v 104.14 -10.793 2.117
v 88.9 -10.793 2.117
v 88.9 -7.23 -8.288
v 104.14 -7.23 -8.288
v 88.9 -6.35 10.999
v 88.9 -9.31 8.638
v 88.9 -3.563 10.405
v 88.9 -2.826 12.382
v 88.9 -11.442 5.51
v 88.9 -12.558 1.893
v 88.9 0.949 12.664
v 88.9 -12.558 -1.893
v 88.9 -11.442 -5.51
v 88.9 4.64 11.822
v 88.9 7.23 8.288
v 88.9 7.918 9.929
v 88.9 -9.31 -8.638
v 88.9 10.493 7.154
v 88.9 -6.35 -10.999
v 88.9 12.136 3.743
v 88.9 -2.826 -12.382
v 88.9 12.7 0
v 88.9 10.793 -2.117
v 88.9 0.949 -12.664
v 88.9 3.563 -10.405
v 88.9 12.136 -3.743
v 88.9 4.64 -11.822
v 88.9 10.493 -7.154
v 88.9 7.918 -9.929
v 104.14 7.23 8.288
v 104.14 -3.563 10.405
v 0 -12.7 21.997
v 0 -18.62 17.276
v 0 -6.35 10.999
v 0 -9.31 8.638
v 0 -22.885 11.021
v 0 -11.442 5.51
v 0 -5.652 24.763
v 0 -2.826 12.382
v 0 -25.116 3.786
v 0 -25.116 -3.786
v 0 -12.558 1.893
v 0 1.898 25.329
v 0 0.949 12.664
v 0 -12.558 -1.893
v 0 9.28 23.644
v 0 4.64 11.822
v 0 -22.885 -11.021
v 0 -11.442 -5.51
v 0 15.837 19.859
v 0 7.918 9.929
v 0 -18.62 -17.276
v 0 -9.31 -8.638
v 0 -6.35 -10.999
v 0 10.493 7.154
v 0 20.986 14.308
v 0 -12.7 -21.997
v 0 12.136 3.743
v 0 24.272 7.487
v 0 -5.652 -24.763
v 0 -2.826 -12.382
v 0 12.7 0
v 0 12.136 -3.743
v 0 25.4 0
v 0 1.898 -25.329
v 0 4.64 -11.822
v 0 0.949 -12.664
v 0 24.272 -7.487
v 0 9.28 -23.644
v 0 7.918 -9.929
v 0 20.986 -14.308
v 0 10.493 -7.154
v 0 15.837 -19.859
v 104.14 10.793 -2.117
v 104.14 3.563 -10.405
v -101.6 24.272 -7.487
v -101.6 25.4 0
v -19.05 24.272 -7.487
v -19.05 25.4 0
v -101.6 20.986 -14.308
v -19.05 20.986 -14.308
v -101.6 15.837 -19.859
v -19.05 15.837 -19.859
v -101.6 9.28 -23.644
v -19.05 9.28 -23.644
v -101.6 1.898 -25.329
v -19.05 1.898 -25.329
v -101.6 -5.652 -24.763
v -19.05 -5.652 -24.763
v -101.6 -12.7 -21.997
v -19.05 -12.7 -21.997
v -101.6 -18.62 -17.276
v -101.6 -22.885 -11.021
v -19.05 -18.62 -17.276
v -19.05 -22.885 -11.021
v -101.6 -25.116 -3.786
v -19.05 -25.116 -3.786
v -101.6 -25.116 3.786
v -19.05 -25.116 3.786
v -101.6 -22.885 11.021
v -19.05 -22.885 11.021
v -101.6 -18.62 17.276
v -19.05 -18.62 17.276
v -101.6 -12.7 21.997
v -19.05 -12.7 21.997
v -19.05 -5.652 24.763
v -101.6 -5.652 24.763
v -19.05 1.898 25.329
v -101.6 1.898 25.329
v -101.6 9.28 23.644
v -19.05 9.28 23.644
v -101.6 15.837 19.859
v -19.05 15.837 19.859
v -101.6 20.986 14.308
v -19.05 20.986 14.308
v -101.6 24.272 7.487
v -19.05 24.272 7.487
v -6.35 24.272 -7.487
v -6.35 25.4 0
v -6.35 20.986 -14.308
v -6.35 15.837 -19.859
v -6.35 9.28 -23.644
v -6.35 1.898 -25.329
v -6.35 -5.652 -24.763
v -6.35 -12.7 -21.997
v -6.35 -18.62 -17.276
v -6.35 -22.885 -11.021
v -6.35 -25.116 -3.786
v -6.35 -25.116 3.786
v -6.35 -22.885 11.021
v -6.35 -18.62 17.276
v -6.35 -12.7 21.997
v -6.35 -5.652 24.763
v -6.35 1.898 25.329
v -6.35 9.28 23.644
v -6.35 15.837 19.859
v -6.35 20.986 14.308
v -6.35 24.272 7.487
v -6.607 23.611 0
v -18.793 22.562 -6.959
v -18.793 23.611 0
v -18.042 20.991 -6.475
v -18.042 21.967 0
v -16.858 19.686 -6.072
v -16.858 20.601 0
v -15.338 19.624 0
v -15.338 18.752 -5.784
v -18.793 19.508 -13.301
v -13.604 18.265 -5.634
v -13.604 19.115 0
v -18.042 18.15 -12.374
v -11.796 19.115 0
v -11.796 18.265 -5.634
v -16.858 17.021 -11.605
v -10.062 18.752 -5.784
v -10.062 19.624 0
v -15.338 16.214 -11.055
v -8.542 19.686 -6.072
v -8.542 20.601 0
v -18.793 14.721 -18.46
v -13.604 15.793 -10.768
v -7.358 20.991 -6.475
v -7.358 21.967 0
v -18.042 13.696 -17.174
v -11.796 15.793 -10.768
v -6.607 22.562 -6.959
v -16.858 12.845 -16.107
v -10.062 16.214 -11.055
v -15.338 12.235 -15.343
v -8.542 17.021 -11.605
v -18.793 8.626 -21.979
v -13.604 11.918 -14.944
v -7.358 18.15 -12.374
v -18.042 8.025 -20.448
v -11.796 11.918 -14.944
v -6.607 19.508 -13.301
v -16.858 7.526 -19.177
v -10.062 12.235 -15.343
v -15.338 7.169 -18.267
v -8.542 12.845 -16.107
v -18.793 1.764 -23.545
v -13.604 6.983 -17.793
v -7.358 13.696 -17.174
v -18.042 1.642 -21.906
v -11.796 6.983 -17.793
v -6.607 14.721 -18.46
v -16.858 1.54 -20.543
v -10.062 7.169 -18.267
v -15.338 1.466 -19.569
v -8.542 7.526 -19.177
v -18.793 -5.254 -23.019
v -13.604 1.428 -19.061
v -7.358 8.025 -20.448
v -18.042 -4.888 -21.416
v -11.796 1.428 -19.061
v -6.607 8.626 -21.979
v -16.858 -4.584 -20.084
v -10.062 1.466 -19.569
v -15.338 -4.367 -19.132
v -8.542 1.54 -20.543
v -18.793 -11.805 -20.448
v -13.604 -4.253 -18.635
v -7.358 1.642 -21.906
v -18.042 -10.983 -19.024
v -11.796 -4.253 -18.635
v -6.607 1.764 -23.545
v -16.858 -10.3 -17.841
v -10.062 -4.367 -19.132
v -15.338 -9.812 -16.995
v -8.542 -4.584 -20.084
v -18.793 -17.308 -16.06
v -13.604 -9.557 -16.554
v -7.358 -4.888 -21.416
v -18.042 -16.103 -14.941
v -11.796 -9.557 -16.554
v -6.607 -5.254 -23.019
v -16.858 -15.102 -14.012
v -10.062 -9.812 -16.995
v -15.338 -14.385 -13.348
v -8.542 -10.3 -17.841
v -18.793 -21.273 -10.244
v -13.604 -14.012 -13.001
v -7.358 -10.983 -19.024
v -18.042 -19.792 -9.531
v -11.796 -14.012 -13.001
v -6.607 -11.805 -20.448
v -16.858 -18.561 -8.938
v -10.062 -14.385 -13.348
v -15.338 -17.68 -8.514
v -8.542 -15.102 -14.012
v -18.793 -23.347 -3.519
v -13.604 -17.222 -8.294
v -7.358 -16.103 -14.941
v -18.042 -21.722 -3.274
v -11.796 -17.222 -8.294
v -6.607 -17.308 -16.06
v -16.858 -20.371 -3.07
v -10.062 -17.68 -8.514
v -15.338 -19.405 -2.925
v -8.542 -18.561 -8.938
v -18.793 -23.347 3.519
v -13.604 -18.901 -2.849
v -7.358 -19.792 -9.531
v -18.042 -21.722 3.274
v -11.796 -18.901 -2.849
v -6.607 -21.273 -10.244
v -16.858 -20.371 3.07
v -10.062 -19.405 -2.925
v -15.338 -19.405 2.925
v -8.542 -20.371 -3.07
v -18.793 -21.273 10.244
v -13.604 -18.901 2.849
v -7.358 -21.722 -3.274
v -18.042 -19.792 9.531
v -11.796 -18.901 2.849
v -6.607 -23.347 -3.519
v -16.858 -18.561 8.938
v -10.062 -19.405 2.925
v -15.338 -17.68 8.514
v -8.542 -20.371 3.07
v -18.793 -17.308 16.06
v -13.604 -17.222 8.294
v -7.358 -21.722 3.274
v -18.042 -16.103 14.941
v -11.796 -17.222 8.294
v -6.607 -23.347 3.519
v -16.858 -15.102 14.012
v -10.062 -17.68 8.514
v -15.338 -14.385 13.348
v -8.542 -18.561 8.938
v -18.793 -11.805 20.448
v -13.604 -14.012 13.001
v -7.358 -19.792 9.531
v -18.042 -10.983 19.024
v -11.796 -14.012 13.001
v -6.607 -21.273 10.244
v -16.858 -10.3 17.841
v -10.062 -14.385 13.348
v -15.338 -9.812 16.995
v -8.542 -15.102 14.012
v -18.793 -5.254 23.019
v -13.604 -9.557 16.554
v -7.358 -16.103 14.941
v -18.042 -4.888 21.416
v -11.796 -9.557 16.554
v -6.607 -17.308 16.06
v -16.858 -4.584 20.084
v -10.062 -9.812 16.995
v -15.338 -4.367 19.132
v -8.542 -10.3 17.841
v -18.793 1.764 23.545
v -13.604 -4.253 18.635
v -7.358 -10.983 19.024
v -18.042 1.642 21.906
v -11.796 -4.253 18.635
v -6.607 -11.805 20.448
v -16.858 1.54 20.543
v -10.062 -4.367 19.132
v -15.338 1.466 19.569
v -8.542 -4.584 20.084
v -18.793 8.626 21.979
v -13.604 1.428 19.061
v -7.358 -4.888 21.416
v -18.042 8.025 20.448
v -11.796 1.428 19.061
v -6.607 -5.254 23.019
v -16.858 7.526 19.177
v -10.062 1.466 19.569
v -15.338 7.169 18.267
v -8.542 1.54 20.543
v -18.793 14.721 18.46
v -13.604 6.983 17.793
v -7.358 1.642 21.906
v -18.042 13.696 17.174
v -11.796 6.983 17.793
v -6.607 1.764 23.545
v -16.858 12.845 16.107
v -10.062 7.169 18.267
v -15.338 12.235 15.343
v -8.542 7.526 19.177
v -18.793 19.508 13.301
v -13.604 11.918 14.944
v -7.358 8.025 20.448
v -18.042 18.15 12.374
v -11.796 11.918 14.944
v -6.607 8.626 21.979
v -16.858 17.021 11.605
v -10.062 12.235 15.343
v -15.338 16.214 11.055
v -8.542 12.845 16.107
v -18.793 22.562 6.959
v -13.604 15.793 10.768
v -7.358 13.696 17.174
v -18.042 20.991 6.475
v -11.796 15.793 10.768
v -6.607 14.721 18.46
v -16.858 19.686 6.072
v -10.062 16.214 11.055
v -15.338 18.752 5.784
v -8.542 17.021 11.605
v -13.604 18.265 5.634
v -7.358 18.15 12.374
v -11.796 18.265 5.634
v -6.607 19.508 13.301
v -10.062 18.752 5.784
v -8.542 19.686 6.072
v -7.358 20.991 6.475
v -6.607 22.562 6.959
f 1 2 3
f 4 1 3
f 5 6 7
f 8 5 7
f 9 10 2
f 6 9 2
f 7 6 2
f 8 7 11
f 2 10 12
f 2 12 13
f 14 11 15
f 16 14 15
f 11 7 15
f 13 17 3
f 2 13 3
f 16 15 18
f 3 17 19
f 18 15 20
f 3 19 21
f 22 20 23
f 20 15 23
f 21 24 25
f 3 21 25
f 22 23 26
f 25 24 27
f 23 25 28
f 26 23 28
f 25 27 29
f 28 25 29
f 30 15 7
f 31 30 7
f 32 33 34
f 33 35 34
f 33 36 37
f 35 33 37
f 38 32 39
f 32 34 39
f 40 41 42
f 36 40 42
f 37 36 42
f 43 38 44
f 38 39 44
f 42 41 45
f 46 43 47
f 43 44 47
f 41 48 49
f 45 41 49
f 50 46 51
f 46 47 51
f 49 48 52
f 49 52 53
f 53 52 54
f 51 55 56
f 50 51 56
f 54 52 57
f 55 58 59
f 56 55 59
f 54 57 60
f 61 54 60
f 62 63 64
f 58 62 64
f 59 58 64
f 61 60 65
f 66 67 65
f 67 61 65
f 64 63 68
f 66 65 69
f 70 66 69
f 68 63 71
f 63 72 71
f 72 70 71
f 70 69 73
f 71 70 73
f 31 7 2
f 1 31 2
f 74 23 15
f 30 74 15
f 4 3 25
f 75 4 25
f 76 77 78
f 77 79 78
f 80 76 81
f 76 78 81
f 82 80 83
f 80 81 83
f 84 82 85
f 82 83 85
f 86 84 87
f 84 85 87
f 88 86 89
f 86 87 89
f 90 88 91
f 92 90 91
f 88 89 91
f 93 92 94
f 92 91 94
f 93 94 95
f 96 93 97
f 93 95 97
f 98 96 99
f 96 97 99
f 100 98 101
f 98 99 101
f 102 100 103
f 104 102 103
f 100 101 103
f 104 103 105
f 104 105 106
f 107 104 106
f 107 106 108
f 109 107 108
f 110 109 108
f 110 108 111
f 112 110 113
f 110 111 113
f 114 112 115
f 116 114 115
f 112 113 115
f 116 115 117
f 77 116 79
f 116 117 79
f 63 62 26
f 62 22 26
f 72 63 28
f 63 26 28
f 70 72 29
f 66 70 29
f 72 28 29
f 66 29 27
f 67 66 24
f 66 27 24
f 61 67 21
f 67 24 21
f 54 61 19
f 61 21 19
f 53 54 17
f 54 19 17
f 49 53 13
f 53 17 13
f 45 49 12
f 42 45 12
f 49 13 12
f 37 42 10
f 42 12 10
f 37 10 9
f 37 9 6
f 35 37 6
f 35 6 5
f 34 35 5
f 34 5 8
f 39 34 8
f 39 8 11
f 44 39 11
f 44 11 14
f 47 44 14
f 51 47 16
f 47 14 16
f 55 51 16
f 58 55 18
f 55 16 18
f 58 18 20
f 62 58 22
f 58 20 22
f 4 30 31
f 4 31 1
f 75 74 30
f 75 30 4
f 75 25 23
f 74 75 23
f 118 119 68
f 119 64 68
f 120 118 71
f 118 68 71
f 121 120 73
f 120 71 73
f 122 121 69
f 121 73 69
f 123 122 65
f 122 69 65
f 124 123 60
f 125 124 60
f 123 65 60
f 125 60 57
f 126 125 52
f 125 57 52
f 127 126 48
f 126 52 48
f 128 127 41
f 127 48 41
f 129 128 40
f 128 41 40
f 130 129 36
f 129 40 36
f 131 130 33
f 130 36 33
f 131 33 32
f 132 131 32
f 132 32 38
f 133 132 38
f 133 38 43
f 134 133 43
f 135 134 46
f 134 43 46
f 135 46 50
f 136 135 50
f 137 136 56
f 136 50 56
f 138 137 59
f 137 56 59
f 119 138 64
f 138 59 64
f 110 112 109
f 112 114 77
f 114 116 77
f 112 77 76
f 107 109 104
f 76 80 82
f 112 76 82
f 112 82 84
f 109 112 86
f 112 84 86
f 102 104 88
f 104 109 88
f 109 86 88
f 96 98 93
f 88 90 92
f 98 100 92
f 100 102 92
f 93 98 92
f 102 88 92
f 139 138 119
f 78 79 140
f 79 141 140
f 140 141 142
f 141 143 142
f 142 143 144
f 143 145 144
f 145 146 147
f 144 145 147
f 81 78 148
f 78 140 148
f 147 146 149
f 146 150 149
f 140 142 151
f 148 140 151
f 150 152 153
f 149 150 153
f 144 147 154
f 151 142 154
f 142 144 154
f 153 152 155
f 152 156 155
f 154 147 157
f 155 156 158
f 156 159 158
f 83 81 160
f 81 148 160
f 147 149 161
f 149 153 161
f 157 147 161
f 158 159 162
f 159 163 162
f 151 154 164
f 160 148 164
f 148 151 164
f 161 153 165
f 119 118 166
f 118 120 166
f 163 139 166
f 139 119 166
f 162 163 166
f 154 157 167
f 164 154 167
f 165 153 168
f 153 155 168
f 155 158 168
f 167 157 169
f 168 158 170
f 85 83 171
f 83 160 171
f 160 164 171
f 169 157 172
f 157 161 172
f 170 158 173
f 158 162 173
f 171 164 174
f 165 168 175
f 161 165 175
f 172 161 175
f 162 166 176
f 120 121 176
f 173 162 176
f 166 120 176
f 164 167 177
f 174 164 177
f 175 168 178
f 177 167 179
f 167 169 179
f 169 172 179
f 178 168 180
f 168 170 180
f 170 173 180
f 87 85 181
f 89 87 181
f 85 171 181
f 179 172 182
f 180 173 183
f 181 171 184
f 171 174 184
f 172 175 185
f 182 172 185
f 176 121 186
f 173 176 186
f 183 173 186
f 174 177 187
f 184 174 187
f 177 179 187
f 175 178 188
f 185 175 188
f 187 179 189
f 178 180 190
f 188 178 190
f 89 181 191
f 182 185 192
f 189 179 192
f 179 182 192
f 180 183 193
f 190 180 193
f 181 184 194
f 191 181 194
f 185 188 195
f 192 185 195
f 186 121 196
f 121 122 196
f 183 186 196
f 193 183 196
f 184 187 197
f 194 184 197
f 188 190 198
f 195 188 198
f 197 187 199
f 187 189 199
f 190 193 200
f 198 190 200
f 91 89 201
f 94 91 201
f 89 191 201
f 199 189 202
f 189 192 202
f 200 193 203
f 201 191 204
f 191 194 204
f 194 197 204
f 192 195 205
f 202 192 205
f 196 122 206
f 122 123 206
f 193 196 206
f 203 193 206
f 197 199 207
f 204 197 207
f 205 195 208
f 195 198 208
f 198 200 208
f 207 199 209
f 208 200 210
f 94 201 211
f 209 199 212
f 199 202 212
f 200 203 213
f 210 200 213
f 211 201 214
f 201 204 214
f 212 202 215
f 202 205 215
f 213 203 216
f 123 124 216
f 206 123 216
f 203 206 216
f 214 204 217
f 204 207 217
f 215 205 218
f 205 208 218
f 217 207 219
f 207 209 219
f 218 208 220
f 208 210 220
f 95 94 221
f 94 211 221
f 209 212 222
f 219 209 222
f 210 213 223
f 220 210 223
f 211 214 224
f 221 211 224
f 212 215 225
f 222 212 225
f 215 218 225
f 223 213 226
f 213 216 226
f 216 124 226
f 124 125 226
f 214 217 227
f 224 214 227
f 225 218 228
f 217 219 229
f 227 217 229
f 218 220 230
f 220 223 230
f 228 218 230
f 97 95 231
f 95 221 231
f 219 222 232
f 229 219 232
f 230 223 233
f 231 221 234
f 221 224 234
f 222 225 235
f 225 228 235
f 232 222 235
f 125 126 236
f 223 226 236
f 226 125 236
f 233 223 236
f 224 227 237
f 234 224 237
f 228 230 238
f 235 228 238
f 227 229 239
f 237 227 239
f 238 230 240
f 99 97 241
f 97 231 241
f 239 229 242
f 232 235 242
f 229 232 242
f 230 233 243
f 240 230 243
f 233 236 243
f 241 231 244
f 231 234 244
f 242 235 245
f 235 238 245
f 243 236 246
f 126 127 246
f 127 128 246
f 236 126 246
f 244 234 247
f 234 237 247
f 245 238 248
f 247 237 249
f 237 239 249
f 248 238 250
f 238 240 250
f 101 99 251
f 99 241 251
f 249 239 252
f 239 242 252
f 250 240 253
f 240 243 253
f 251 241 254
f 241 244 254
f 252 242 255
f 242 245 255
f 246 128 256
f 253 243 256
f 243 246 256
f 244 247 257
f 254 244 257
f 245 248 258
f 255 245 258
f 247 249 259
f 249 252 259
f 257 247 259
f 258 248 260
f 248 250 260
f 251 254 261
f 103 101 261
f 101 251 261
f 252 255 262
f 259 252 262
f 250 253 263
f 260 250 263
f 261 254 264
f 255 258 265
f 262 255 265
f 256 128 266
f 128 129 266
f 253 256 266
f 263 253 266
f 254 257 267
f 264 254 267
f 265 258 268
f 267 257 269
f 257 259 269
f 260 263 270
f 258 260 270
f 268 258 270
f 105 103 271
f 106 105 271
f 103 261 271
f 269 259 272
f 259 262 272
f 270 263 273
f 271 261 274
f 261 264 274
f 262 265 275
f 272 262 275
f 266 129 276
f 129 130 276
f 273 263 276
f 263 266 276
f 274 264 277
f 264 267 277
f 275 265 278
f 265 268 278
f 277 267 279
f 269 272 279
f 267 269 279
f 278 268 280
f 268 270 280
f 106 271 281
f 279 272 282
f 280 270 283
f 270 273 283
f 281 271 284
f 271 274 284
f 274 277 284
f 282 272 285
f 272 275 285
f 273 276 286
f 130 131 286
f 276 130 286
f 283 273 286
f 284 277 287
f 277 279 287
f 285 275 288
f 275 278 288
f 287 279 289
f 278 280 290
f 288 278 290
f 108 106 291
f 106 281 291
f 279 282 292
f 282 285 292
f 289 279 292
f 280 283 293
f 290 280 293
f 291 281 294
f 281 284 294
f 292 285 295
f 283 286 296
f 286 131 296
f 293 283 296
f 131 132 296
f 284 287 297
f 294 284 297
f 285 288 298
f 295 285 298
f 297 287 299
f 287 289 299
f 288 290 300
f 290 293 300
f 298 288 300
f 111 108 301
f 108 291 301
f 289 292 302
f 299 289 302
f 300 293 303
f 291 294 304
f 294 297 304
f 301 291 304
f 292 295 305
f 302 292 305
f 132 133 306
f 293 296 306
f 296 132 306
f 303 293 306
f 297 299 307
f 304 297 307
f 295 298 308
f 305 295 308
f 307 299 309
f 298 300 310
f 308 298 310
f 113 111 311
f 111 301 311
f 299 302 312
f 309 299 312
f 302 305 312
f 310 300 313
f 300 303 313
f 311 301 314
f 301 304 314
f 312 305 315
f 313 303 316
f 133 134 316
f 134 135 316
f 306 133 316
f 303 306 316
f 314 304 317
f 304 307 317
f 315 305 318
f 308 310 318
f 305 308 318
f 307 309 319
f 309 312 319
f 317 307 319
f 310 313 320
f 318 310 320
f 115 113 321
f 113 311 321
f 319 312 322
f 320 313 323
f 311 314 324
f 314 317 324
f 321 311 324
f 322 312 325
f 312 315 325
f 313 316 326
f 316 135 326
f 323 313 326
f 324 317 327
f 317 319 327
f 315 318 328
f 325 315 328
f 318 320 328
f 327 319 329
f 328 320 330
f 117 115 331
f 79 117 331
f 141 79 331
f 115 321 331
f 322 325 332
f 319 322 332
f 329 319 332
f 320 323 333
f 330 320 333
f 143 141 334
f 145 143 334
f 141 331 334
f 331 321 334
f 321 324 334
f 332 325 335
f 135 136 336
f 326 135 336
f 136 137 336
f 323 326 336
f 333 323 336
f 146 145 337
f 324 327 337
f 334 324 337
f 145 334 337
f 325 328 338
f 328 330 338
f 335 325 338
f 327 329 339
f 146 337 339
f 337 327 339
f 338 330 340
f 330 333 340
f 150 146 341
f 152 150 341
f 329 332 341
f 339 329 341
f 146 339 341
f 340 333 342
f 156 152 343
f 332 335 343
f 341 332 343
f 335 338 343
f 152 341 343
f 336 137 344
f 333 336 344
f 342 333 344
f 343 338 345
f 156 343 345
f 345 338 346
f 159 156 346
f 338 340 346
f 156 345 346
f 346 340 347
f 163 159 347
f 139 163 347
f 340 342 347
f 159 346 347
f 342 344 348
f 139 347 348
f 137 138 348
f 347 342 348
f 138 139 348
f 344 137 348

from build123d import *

# Parameters (mm, degrees)
BOSS_EXTRUDE1_DEPTH = 15.24


with BuildPart() as part:
    # Sketch1 → Revolve1 (revolve)
    with BuildSketch(Plane.XY):
        with BuildLine():
            Line((0, 0), (-101.6, 0))
            Line((-101.6, 0), (-101.6, 25.4))
            Line((-101.6, 25.4), (-19.05, 25.4))
            ThreePointArc((-19.05, 25.4), (-12.7, 19.05), (-6.35, 25.4))
            Line((-6.35, 25.4), (0, 25.4))
            Line((0, 25.4), (0, 12.7))
            Line((0, 12.7), (88.9, 12.7))
            Line((88.9, 12.7), (88.9, 0))
            Line((88.9, 0), (0, 0))
        make_face()
    revolve(axis=Axis((0, 0, 0), (-1, 0, 0)))

    # Sketch2 → Boss-Extrude1 (add)
    with BuildSketch(Plane(origin=(88.9, 0, 0), x_dir=(0, 0, -1), z_dir=(1, 0, 0))):
        Polygon((8.288184077, -7.230041819), (10.405491924, 3.562757053), (2.117307847, 10.792798872), (-8.288184077, 7.230041819), (-10.405491924, -3.562757053), (-2.117307847, -10.792798872), align=None)
    extrude(amount=BOSS_EXTRUDE1_DEPTH)


solid = part.part
